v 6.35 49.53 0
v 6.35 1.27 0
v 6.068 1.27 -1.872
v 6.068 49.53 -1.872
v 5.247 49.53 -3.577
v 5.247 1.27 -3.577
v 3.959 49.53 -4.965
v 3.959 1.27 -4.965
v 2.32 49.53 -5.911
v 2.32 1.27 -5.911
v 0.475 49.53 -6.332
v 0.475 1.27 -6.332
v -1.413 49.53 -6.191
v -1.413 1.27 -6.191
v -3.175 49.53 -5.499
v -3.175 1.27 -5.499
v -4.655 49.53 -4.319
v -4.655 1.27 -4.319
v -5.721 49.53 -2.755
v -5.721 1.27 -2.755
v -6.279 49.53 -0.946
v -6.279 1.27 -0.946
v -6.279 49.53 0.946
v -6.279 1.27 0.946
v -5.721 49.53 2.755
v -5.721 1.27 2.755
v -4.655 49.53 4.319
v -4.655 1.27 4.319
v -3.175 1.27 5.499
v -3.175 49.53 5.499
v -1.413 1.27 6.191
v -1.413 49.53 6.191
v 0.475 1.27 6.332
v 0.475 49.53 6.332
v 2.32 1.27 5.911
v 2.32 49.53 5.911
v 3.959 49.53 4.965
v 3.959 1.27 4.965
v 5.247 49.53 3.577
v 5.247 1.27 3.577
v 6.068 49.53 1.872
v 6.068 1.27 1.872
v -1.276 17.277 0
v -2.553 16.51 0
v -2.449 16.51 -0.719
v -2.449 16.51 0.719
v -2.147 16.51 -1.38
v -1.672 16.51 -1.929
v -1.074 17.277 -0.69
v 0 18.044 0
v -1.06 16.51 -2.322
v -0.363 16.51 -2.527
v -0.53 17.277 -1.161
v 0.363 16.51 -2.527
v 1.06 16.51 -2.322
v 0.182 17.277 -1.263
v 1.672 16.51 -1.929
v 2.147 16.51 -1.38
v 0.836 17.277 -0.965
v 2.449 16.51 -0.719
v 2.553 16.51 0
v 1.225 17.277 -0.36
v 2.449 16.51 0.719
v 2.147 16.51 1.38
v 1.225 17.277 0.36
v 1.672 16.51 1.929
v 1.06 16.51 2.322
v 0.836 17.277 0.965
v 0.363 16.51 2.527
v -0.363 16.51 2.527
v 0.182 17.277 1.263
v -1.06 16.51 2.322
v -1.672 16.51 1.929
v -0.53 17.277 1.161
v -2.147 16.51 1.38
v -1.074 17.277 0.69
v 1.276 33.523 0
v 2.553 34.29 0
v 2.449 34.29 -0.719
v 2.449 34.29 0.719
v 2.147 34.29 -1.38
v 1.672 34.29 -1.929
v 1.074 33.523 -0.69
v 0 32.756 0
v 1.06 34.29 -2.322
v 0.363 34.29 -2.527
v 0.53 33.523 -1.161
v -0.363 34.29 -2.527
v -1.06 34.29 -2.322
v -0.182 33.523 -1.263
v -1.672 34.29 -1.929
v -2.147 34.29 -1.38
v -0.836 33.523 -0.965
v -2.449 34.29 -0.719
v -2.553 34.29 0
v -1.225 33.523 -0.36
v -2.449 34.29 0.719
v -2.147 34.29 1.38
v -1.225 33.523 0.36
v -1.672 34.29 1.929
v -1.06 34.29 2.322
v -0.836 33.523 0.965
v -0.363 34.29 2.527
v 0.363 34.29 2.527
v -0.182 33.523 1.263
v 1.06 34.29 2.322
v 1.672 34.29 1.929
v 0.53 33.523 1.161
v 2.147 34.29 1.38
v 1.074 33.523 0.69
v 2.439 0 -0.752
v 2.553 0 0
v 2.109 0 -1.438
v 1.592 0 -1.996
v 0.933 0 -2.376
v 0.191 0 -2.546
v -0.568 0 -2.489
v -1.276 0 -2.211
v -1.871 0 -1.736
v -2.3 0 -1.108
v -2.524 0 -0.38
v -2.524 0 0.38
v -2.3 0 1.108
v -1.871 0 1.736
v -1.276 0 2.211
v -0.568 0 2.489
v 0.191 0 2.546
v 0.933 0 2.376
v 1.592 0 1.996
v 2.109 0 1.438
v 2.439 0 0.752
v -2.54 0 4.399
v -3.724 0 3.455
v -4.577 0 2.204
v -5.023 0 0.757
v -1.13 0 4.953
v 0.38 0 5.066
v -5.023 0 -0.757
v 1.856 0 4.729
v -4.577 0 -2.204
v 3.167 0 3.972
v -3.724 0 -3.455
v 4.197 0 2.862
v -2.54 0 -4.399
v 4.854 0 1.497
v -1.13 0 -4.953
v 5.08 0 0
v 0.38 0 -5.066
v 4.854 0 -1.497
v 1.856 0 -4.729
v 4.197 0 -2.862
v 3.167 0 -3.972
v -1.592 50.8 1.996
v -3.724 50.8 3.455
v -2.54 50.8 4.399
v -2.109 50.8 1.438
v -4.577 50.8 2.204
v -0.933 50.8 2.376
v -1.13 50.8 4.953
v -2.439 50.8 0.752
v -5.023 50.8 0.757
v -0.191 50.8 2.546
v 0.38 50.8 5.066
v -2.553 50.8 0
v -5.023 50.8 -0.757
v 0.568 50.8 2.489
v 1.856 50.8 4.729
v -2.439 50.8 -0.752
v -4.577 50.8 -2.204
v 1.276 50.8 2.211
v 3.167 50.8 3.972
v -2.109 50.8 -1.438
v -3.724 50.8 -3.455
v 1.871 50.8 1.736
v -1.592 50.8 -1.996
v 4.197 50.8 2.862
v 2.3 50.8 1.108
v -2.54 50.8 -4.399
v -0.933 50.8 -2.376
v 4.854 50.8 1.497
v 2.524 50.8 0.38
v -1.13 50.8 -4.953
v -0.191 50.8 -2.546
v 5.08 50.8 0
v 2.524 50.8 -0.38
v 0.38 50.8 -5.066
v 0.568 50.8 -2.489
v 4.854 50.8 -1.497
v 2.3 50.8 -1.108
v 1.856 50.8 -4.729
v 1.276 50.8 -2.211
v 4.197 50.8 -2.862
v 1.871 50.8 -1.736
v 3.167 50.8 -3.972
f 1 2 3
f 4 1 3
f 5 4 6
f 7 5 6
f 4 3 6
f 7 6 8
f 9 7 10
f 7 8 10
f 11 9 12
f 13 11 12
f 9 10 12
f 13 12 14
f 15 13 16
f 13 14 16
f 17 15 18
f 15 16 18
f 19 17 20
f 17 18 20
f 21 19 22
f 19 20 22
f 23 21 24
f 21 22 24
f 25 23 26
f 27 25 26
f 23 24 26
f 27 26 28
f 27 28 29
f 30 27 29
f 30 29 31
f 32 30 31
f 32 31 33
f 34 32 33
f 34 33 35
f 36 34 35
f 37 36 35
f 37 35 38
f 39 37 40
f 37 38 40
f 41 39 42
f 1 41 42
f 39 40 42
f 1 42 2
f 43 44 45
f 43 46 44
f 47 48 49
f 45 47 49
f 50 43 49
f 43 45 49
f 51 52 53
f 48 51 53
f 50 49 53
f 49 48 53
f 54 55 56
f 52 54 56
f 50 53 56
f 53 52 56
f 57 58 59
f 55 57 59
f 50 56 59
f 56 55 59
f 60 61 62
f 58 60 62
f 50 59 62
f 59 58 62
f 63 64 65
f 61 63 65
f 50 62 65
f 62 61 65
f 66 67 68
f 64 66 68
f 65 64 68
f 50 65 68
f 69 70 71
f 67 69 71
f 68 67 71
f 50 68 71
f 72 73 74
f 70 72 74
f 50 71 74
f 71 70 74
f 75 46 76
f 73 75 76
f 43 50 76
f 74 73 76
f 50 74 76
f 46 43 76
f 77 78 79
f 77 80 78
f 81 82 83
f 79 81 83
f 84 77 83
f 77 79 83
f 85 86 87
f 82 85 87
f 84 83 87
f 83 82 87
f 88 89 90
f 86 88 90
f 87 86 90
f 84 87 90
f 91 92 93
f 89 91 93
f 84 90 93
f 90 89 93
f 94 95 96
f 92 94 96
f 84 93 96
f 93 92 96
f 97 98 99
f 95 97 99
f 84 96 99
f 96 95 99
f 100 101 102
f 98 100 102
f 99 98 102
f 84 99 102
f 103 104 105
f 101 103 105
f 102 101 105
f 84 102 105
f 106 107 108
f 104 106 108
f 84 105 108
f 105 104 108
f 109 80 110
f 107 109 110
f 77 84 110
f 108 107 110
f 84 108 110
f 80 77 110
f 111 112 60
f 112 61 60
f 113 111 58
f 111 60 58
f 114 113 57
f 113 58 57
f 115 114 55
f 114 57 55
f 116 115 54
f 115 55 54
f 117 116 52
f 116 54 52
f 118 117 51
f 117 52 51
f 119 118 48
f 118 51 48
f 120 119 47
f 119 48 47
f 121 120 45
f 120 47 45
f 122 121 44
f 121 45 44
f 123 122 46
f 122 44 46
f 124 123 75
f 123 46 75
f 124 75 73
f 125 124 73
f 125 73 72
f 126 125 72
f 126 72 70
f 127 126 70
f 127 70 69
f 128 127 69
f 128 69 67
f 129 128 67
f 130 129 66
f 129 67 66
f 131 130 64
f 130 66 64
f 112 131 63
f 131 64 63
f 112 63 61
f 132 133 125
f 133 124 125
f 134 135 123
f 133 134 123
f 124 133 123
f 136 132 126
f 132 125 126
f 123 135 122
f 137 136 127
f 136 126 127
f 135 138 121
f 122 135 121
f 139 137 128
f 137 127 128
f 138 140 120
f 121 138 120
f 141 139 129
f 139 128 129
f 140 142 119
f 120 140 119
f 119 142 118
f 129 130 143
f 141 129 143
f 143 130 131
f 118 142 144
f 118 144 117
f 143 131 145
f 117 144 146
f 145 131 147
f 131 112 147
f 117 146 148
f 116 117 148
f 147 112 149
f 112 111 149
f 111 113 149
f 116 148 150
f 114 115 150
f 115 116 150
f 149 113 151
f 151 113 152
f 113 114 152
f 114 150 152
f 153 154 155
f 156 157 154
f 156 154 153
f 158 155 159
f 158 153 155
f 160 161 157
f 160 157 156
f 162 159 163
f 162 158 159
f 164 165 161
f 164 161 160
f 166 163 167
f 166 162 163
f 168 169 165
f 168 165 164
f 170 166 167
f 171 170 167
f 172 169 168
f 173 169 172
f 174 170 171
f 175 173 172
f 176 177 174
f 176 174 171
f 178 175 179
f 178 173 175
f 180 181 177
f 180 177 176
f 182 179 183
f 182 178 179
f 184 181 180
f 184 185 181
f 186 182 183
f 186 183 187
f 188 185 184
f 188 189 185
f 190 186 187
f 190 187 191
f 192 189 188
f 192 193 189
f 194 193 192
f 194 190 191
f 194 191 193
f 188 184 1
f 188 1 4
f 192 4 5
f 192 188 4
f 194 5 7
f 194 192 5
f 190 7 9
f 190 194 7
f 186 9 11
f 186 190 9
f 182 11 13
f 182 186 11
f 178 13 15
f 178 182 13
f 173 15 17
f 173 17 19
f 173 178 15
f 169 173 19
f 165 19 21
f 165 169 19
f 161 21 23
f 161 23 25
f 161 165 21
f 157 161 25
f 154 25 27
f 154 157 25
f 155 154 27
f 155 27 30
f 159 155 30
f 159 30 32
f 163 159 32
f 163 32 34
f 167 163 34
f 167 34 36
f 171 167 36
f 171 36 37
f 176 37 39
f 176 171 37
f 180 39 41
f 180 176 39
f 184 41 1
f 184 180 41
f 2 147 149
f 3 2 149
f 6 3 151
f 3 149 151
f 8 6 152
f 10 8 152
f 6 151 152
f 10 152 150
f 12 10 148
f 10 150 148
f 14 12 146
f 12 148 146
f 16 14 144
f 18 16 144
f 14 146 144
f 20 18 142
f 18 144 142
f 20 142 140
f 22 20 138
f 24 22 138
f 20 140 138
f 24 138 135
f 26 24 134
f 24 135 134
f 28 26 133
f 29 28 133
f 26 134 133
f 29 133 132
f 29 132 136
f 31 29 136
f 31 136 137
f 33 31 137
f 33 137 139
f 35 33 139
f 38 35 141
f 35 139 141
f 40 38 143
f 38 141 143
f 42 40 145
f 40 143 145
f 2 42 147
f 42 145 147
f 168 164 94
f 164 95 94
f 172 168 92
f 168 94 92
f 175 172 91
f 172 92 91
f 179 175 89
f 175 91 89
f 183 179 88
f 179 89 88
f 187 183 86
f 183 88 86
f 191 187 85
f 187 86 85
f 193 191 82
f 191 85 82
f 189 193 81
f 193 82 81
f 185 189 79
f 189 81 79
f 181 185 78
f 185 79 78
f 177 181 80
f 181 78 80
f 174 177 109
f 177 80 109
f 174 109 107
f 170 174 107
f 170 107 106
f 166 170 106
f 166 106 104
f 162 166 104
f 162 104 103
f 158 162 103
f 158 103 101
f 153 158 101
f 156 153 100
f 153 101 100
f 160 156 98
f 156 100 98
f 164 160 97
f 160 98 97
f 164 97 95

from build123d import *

# Parameters (mm, degrees)
SKETCH1_R                   = 6.35
BOSS_EXTRUDE1_DEPTH         = 50.8
CHAMFER1_SIZE               = 1.27
F_1_4_20_TAPPED_HOLE1_D     = 5.1054
F_1_4_20_TAPPED_HOLE1_DEPTH = 16.51
F_1_4_20_TAPPED_HOLE1_TIP   = 1.533816902
F_1_4_20_TAPPED_HOLE2_D     = 5.1054
F_1_4_20_TAPPED_HOLE2_DEPTH = 16.51
F_1_4_20_TAPPED_HOLE2_TIP   = 1.533816902


with BuildPart() as part:
    # Sketch1 → Boss-Extrude1 (new body)
    with BuildSketch(Plane(origin=(0, 0, 0), x_dir=(1, 0, 0), z_dir=(0, 1, 0))):
        Circle(SKETCH1_R)
    extrude(amount=BOSS_EXTRUDE1_DEPTH)

    # Chamfer1
    chamfer1_edges = [part.edges().sort_by_distance(p)[0] for p in [
        (-6.35, 0, 0),
        (-6.35, 50.8, 0),
    ]]
    chamfer(chamfer1_edges, length=CHAMFER1_SIZE)

    # 1/4-20 Tapped Hole1
    with Locations(Plane(origin=(0, 0, 0), x_dir=(-1, 0, 0), z_dir=(0, -1, 0))):
        with Locations((0, 0)):
            Hole(F_1_4_20_TAPPED_HOLE1_D / 2, depth=F_1_4_20_TAPPED_HOLE1_DEPTH)
            with Locations((0, 0, -(F_1_4_20_TAPPED_HOLE1_DEPTH + F_1_4_20_TAPPED_HOLE1_TIP / 2))):  # 118° drill point
                Cone(0, F_1_4_20_TAPPED_HOLE1_D / 2, F_1_4_20_TAPPED_HOLE1_TIP, mode=Mode.SUBTRACT)

    # 1/4-20 Tapped Hole2
    with Locations(Plane(origin=(0, 50.8, 0), x_dir=(1, 0, 0), z_dir=(0, 1, 0))):
        with Locations((0, 0)):
            Hole(F_1_4_20_TAPPED_HOLE2_D / 2, depth=F_1_4_20_TAPPED_HOLE2_DEPTH)
            with Locations((0, 0, -(F_1_4_20_TAPPED_HOLE2_DEPTH + F_1_4_20_TAPPED_HOLE2_TIP / 2))):  # 118° drill point
                Cone(0, F_1_4_20_TAPPED_HOLE2_D / 2, F_1_4_20_TAPPED_HOLE2_TIP, mode=Mode.SUBTRACT)


solid = part.part
